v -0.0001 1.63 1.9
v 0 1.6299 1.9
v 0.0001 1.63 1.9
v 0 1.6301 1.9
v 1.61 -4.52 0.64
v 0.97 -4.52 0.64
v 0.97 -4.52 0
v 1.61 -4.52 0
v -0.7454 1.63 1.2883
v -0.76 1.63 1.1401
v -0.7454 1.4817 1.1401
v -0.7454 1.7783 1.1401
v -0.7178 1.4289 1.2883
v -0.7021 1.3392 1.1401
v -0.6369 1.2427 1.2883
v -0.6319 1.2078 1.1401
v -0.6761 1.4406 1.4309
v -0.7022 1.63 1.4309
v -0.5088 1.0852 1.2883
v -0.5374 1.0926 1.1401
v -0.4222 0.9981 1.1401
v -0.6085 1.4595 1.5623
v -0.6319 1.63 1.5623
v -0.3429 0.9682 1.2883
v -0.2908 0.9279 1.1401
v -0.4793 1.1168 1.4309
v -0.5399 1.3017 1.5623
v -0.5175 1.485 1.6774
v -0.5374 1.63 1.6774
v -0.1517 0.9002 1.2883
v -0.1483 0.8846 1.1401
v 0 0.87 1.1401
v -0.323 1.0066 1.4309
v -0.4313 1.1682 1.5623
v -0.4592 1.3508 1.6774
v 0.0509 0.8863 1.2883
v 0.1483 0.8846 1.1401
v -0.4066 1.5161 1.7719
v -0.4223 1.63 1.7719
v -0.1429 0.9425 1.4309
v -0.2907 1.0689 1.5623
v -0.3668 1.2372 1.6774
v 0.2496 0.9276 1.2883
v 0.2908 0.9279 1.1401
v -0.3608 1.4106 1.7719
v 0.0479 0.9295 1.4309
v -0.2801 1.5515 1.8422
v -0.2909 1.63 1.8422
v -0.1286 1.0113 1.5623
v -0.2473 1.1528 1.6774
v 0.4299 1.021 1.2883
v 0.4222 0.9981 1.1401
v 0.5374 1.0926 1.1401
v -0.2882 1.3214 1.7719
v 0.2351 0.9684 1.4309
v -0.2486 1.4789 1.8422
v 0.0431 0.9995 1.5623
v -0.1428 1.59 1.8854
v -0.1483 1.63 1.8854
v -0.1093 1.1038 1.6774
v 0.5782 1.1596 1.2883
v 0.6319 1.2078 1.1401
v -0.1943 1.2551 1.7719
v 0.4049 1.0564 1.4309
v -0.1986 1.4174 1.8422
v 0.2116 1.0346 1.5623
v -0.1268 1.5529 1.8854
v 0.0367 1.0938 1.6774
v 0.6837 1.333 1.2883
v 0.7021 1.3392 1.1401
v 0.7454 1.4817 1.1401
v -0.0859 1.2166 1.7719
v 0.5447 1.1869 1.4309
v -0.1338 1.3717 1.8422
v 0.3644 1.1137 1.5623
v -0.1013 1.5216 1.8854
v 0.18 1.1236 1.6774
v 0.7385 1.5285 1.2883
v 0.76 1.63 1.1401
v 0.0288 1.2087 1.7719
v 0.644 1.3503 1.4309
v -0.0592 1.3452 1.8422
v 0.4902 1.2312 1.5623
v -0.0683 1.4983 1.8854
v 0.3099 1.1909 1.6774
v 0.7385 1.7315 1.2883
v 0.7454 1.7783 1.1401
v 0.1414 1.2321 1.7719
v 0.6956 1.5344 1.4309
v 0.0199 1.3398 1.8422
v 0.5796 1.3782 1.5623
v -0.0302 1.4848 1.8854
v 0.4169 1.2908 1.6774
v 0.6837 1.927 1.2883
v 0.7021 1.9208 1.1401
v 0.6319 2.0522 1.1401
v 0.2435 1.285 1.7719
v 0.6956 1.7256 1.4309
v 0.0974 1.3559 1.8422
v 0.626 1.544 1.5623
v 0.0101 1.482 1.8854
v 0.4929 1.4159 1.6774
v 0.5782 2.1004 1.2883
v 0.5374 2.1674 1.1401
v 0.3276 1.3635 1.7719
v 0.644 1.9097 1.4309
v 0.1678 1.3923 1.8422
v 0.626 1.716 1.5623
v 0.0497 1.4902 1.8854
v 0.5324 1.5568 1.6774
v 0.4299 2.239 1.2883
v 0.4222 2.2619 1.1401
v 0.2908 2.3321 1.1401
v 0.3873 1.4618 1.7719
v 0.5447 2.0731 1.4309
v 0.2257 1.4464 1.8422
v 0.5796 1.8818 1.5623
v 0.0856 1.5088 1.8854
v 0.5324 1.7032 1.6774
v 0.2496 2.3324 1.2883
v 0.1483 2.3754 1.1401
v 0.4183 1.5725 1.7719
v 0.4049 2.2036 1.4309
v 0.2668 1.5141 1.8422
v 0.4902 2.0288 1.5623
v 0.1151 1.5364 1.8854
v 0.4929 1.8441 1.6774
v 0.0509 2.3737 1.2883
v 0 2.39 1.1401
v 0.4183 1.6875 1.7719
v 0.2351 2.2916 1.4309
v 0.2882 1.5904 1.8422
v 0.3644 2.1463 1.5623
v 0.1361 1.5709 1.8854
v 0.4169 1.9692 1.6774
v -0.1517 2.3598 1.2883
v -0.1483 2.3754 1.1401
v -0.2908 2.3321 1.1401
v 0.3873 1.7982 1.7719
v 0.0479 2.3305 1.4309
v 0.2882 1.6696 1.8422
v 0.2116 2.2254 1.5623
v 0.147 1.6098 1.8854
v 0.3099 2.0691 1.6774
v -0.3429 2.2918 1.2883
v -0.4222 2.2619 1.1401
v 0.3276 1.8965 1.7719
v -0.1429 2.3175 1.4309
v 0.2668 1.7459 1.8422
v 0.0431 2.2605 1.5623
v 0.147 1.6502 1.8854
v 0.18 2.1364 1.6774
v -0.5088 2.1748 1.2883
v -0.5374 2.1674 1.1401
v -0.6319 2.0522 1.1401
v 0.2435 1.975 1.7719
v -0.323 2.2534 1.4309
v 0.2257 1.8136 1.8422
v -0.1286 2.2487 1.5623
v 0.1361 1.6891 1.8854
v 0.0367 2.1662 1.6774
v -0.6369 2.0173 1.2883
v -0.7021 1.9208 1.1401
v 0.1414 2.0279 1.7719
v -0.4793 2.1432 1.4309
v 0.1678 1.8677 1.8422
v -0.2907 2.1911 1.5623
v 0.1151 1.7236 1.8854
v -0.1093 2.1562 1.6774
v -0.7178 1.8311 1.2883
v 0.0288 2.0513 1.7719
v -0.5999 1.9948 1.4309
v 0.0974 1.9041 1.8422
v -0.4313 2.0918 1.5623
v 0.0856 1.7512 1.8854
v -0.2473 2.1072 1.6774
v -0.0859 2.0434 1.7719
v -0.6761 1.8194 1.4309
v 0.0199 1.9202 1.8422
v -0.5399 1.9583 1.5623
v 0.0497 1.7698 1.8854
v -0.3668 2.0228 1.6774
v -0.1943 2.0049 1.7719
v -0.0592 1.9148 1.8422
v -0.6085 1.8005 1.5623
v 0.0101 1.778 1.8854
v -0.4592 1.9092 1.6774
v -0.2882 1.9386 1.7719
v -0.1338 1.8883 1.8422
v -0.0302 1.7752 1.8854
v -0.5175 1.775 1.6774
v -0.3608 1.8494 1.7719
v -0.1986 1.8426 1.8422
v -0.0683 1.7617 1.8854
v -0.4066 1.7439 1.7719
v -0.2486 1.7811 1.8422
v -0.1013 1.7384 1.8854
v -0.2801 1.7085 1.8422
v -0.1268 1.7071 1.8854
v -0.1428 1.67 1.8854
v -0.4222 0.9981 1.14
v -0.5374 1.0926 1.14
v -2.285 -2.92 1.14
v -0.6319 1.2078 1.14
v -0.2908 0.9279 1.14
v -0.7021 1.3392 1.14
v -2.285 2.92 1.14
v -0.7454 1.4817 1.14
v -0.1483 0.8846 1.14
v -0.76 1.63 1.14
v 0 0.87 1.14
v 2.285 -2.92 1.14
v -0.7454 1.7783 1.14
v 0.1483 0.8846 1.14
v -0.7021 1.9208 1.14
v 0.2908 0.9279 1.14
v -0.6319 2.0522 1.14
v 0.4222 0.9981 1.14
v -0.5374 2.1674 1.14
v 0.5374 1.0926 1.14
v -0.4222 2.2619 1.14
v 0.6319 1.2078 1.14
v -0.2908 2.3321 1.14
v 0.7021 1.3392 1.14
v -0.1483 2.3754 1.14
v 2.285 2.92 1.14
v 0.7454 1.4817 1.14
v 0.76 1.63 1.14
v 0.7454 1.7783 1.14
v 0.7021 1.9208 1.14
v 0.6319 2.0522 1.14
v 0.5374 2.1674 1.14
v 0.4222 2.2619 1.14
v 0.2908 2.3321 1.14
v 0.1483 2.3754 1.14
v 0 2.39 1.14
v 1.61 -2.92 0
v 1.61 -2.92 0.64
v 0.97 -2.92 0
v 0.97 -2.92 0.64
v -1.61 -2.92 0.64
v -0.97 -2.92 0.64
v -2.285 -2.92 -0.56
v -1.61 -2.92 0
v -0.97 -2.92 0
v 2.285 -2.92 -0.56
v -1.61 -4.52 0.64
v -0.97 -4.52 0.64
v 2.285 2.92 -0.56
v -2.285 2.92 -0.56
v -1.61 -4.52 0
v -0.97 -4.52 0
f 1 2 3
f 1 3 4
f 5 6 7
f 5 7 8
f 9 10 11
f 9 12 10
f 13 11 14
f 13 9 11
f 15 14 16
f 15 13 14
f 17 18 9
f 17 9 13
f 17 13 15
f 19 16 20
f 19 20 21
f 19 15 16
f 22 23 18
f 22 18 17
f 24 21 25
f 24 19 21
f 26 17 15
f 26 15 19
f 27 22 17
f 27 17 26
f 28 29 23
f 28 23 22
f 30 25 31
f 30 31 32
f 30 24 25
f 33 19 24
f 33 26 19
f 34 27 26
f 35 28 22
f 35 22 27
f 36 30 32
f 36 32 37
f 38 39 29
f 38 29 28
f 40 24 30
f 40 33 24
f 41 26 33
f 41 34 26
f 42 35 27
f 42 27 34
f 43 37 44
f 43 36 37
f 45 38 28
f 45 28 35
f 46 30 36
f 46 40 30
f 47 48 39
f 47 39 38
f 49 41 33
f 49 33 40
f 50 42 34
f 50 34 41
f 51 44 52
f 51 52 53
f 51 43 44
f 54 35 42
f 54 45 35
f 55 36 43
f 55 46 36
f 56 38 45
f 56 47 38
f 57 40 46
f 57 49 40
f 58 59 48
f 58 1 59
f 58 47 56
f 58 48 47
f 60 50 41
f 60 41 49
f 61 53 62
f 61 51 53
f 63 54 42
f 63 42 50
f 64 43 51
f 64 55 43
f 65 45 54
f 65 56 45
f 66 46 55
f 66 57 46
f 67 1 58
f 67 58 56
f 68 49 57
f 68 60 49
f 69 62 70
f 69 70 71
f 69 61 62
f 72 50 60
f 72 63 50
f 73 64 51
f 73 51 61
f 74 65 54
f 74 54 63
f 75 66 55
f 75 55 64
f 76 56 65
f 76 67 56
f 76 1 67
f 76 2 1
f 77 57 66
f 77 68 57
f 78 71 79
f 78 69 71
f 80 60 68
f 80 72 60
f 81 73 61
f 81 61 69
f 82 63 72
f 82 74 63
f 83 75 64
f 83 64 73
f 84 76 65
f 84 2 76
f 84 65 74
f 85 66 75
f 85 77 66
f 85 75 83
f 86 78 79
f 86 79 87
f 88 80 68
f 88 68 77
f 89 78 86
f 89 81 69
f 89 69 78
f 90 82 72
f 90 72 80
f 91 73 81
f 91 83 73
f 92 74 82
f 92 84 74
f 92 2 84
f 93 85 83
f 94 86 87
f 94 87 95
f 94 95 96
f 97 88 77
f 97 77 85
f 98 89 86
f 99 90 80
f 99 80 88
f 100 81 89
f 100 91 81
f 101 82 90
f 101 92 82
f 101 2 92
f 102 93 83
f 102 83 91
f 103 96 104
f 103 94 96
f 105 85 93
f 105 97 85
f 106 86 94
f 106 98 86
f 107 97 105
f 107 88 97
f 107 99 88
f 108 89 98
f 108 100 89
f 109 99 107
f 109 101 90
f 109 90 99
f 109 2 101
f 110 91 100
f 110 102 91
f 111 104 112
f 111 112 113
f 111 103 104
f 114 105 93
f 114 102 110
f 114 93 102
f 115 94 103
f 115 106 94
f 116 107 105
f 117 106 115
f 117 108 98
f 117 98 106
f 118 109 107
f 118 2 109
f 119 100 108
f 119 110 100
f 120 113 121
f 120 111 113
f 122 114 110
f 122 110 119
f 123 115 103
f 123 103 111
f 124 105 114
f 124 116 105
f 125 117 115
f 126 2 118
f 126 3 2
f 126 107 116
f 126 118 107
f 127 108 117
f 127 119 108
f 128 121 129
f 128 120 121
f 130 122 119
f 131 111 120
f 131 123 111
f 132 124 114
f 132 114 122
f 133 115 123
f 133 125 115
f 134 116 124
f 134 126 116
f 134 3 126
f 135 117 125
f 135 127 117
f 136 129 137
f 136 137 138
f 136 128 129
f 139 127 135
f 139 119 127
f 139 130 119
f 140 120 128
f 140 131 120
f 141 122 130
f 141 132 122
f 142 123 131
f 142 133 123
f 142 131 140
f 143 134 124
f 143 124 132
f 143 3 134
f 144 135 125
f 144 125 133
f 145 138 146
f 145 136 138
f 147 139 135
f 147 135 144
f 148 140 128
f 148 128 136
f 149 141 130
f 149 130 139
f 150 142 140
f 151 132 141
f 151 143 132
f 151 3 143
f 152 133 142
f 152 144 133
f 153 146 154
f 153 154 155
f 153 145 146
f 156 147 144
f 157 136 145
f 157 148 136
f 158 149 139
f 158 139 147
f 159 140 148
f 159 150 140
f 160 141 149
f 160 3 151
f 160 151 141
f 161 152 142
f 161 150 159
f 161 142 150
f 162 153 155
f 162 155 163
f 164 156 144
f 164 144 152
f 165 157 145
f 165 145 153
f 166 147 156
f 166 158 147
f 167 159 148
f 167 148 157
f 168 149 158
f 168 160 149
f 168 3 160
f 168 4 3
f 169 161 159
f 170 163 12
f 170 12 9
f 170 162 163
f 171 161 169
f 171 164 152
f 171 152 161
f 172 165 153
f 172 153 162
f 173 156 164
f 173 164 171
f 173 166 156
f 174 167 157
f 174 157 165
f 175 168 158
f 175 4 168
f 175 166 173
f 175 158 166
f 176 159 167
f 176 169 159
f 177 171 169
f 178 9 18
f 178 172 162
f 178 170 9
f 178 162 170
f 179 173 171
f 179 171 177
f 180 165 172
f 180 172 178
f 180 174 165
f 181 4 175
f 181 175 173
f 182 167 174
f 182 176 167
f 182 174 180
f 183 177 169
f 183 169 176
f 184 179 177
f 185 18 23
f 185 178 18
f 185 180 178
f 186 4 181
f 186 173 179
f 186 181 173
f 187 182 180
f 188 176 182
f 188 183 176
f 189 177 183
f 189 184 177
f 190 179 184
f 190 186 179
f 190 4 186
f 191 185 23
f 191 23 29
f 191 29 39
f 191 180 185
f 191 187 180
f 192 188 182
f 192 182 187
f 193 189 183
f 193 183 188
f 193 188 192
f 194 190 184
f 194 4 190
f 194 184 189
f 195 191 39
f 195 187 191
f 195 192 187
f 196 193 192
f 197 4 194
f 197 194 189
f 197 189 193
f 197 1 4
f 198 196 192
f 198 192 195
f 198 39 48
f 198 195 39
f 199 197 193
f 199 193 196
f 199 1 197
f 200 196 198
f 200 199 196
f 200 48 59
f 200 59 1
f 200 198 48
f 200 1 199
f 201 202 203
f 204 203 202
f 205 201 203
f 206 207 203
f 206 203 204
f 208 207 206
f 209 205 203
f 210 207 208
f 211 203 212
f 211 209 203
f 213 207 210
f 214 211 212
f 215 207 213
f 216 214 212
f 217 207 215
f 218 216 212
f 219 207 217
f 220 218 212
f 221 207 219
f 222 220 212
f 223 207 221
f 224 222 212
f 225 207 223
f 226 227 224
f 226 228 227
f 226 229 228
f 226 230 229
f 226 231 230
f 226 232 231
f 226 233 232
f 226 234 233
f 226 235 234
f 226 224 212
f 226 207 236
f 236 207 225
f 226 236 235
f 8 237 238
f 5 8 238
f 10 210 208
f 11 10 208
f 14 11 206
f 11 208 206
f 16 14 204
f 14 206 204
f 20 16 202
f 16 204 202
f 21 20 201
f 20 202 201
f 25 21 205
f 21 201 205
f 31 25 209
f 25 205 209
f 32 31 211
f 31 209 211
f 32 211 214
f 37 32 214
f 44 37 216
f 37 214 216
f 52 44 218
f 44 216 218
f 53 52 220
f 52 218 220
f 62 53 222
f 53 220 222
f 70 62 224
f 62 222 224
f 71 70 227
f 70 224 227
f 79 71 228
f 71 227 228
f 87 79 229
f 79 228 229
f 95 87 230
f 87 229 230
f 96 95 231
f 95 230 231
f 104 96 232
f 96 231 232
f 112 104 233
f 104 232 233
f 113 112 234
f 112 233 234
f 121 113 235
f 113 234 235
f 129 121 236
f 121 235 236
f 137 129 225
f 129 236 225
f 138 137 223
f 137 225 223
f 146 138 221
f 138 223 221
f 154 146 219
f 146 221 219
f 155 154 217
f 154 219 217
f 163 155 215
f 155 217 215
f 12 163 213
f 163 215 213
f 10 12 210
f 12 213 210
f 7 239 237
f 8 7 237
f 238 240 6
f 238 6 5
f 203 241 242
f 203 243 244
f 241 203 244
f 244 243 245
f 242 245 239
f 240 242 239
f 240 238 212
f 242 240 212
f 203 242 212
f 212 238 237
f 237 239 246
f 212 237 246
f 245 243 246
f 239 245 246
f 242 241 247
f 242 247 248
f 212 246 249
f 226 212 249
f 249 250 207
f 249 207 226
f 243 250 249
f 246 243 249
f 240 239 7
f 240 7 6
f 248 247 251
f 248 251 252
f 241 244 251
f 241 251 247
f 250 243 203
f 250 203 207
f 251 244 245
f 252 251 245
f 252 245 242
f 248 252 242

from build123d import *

# Parameters (mm, degrees)
BOSS_EXTRUDE1_DEPTH      = 1.14
BOSS_EXTRUDE1_DEPTH_BACK = 0.56
SKETCH2_W                = 4.57
SKETCH2_H                = 5.84
SKETCH3_R                = 0.76
BOSS_EXTRUDE2_DEPTH      = 0.76
FILLET1_R                = 0.76
SKETCH4_W                = 0.64
SKETCH4_H                = 0.64
BOSS_EXTRUDE3_DEPTH      = 1.6
SKETCH5_W                = 0.64
SKETCH5_H                = 0.64
BOSS_EXTRUDE4_DEPTH      = 1.6


with BuildPart() as part:
    # Sketch2 → Boss-Extrude1 (new, two sides: drawn at the far end of the back side and taken through both)
    with BuildSketch(Plane.XY.offset(-BOSS_EXTRUDE1_DEPTH_BACK)):
        Rectangle(SKETCH2_W, SKETCH2_H)
    extrude(amount=BOSS_EXTRUDE1_DEPTH + BOSS_EXTRUDE1_DEPTH_BACK)

    # Sketch3 → Boss-Extrude2 (add)
    with BuildSketch(Plane.XY.offset(1.14)):
        with Locations(Location((0, 1.63, 0), (0, 0, 180))):
            Circle(SKETCH3_R)
    extrude(amount=BOSS_EXTRUDE2_DEPTH)

    # Fillet1
    fillet1_edges = [part.edges().sort_by_distance(p)[0] for p in [
        (0.76, 1.63, 1.9),
    ]]
    fillet(fillet1_edges, radius=FILLET1_R - 0.0001)  # a hair under: the kernel refuses the full size

    # Sketch4 → Boss-Extrude3 (add)
    with BuildSketch(Plane.XZ.offset(2.92)):
        with Locations((1.29, 0.32)):
            Rectangle(SKETCH4_W, SKETCH4_H)
    extrude(amount=BOSS_EXTRUDE3_DEPTH)

    # Sketch5 → Boss-Extrude4 (add)
    with BuildSketch(Plane.XZ.offset(2.92)):
        with Locations((-1.29, 0.32)):
            Rectangle(SKETCH5_W, SKETCH5_H)
    extrude(amount=BOSS_EXTRUDE4_DEPTH)


solid = part.part
